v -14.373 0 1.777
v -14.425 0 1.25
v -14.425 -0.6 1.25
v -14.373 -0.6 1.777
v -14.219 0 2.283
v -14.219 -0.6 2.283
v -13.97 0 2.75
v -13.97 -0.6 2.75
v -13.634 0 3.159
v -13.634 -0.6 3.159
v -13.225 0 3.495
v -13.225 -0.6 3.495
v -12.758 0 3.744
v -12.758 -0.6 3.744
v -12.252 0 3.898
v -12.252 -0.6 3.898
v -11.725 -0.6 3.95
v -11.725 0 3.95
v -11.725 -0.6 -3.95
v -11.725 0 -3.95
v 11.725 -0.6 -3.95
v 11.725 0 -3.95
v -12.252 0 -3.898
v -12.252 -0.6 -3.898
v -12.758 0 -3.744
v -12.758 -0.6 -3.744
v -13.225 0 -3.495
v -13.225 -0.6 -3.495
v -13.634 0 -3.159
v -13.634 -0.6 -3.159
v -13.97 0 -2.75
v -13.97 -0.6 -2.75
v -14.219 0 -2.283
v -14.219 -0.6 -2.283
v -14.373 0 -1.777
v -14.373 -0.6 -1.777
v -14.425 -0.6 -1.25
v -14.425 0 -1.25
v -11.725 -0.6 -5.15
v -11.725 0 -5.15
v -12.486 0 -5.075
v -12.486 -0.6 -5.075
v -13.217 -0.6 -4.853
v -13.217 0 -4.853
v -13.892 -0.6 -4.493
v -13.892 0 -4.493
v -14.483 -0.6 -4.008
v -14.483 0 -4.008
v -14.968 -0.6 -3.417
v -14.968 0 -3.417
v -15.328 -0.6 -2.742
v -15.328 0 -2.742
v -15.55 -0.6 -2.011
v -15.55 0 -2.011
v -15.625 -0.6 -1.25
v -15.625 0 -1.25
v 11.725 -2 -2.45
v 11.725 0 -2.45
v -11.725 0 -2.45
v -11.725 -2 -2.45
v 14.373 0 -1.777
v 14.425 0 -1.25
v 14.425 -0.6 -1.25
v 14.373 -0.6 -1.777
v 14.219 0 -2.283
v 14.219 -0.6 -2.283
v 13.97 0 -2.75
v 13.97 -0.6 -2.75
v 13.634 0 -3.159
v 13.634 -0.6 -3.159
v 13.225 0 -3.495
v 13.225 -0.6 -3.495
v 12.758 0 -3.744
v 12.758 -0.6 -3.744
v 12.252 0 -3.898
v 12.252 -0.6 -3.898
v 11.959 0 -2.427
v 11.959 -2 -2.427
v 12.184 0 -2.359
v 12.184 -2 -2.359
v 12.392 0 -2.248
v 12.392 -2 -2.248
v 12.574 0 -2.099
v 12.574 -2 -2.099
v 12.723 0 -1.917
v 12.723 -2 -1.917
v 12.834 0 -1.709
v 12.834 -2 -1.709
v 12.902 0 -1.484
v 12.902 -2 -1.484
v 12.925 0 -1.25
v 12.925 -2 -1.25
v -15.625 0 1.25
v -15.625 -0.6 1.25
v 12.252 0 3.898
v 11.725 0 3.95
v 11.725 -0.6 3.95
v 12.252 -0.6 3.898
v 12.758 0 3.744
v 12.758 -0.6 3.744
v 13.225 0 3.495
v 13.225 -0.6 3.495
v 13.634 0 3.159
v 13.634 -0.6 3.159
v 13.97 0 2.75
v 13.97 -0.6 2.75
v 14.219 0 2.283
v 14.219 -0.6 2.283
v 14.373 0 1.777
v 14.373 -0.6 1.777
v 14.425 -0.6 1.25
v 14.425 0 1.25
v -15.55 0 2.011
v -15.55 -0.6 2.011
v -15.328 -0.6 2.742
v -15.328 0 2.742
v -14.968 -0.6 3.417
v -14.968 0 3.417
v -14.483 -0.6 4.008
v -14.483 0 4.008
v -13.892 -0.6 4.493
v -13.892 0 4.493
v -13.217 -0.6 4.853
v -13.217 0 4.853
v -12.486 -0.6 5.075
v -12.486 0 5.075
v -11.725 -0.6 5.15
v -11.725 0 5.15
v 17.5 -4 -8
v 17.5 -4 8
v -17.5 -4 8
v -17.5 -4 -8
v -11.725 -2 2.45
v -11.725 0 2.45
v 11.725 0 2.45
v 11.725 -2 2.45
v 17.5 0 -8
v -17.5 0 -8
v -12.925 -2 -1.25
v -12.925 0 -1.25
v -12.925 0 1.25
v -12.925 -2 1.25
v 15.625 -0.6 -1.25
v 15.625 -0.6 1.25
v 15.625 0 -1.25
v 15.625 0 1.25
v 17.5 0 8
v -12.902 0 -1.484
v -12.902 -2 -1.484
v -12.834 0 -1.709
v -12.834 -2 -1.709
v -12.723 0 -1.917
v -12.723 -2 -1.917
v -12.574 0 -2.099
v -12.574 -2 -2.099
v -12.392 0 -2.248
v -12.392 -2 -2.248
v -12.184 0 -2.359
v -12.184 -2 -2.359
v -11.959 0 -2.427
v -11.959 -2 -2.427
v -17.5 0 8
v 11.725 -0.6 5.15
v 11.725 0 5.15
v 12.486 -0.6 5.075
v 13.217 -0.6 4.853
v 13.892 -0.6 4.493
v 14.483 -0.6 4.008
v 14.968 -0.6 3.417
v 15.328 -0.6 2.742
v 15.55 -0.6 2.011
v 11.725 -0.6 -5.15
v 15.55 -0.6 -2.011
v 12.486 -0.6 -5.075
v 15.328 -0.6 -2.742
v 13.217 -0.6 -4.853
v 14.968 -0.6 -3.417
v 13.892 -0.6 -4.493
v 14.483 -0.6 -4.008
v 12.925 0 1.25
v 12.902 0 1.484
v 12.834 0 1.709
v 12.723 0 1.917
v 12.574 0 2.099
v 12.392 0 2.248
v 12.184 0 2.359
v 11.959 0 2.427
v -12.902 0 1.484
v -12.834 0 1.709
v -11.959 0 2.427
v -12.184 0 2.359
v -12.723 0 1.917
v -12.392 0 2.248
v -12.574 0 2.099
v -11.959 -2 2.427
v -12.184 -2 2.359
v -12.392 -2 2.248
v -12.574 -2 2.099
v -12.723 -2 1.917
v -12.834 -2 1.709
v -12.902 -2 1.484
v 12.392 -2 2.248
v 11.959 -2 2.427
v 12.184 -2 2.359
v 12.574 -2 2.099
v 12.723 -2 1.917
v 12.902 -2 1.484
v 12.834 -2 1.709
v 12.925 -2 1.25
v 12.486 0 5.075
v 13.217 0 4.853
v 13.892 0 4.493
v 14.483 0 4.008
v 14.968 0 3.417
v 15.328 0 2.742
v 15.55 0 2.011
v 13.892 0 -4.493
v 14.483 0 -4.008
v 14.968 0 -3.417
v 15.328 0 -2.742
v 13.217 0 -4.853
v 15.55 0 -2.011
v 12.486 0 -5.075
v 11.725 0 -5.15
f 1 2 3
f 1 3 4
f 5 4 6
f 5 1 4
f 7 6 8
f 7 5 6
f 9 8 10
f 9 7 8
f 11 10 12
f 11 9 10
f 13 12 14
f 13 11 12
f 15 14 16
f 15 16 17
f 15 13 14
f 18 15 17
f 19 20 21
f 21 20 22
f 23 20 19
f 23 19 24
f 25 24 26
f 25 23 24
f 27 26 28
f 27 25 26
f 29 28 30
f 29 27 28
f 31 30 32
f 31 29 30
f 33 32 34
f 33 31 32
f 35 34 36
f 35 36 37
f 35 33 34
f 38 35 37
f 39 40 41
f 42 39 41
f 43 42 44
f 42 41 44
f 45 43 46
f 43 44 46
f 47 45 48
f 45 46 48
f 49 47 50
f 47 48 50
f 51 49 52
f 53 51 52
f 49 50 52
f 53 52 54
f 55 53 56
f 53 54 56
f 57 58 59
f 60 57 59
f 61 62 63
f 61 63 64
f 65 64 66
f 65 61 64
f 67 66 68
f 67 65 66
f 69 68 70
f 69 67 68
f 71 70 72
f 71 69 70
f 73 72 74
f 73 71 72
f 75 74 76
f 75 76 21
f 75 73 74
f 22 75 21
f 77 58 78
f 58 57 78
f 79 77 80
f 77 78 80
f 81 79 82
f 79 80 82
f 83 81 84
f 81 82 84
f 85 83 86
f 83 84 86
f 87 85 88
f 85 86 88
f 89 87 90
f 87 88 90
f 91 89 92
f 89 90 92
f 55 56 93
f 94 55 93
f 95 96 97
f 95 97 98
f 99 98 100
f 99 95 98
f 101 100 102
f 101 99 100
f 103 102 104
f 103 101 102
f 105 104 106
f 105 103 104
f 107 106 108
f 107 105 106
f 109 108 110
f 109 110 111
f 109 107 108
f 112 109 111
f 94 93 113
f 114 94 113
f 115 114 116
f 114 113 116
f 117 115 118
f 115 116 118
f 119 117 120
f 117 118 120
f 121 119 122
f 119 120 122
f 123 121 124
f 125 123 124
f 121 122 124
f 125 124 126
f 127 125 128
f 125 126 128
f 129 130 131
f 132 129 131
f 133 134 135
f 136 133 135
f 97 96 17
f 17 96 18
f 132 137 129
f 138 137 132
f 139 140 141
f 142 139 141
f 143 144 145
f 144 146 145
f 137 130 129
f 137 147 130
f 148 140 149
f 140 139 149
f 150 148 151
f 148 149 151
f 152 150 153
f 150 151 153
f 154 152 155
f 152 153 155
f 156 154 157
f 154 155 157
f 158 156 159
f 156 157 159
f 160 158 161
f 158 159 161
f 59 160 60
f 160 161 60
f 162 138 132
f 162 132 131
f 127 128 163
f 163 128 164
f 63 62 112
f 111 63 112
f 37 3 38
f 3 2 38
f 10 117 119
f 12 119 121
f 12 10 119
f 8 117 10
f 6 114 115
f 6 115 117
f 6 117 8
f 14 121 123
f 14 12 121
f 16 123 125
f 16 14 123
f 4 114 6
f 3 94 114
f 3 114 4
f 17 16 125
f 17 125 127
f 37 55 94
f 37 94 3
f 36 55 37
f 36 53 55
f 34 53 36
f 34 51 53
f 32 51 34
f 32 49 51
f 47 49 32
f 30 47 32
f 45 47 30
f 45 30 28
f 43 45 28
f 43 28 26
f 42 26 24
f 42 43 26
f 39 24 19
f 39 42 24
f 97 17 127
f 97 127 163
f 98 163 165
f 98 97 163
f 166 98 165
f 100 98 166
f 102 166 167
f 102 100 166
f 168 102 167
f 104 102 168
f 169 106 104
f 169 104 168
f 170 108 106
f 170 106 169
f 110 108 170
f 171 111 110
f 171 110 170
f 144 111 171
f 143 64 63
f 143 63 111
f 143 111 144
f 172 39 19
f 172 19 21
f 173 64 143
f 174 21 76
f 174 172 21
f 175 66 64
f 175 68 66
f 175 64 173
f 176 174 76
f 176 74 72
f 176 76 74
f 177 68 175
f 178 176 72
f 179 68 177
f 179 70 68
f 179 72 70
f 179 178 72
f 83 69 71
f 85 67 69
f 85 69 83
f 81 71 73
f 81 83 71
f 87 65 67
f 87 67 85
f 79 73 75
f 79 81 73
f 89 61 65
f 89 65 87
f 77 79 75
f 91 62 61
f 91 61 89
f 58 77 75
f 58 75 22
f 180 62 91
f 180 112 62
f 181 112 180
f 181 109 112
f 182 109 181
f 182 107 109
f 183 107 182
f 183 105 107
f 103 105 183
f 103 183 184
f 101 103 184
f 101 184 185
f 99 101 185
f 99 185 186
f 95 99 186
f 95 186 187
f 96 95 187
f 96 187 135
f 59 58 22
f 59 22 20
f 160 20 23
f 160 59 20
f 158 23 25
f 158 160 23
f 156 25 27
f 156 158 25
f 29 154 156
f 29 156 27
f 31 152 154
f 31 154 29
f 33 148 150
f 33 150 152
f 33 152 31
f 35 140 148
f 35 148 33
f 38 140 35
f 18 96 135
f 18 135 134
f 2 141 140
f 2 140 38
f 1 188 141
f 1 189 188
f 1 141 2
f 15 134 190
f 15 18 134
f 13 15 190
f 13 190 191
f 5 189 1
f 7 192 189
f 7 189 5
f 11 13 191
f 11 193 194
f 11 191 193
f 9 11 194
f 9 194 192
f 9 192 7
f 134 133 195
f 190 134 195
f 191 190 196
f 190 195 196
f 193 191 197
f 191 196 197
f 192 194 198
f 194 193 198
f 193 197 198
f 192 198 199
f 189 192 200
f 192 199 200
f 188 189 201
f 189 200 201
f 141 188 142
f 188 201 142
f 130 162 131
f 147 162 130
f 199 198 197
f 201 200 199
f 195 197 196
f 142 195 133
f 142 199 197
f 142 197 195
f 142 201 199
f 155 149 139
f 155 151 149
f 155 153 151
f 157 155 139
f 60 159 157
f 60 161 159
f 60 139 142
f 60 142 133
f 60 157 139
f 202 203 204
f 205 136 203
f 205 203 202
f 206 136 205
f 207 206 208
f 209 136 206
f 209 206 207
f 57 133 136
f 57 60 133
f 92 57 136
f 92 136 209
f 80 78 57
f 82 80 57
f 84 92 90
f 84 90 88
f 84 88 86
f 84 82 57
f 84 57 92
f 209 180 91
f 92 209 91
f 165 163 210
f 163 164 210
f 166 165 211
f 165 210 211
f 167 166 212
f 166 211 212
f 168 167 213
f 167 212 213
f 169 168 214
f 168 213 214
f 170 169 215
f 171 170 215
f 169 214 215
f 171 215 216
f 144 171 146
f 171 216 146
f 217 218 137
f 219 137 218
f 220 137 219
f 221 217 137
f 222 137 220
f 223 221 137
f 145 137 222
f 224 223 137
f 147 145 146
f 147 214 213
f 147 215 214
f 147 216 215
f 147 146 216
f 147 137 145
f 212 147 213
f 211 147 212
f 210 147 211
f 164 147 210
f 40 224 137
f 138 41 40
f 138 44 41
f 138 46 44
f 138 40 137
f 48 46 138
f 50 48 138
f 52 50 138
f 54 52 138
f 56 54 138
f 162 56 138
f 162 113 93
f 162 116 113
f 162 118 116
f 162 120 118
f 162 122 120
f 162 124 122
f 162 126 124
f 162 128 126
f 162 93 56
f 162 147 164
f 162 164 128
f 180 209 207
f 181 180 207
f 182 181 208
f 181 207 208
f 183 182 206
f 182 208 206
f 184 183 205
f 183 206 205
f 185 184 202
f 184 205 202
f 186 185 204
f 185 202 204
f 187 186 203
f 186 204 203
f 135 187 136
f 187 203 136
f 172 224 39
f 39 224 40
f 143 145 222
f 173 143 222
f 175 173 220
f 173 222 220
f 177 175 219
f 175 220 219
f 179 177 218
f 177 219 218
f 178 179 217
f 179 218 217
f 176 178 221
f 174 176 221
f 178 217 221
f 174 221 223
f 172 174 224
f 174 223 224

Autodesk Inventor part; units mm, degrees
ref_plane "YZ Plane" through (0, 0, 0) normal (1, 0, 0) x (0, 1, 0)
ref_plane "XZ Plane" through (0, 0, 0) normal (0, 1, 0) x (-1, 0, 0)
ref_plane "XY Plane" through (0, 0, 0) normal (0, 0, 1) x (1, 0, 0)
sketch "Sketch1" plane through (0, 0, 0) normal (0, 1, 0) x (-1, 0, 0)
  line L0 (13.925, -3.65) -> (-13.925, -3.65)
  line L1 (-13.925, -3.65) -> (-13.925, 3.65)
  line L2 (-13.925, 3.65) -> (13.925, 3.65)
  line L3 (13.925, 3.65) -> (13.925, -3.65)
  line L4 (13.925, -3.65) -> (-13.925, 3.65) construction
  line L5 (-13.925, -3.65) -> (13.925, 3.65) construction
  line L6 (11.725, -1.25) -> (-11.725, -1.25)
  line L7 (-11.725, -1.25) -> (-11.725, 1.25)
  line L8 (-11.725, 1.25) -> (11.725, 1.25)
  line L9 (11.725, 1.25) -> (11.725, -1.25)
  line L10 (11.725, -1.25) -> (-11.725, 1.25) construction
  line L11 (-11.725, -1.25) -> (11.725, 1.25) construction
  line L12 (11.725, -1.25) -> (11.725, -3.65) construction
  line L13 (11.725, 1.25) -> (11.725, 3.65) construction
  line L14 (11.725, -1.25) -> (13.925, -1.25) construction
  line L15 (-11.725, -1.25) -> (-13.925, -1.25) construction
  point P0 (0, 0)
  point P1 (0, 0)
  point P2 (0, 0)
  point P3 (0, 0)
  dimension "d0" = 27.85
  dimension "d1" = 7.3
  dimension "d2" = 2.4
  dimension "d3" = 2.4
  dimension "d4" = 2.5
  dimension "d5" = 2.2
  dimension "d6" = 23.45
sketch "Sketch2" plane through (0, 0, 0) normal (0, 1, 0) x (-1, 0, 0)
  line L0 (17.5, 8) -> (-17.5, 8)
  line L1 (-17.5, 8) -> (-17.5, -8)
  line L2 (-17.5, -8) -> (17.5, -8)
  line L3 (17.5, -8) -> (17.5, 8)
  line L4 (17.5, 8) -> (-17.5, -8) construction
  point P0 (0, 0)
  point P1 (0, 0)
  dimension "d7" = 35
  dimension "d8" = 16
extrude "Extrusion1" add sketch "Sketch2" against normal blind 4
sketch "Sketch5" plane through (0, 0, 0) normal (0, 1, 0) x (1, 0, 0)
  line L0 (-12.925, -2.45) -> (12.925, -2.45)
  line L1 (12.925, -2.45) -> (12.925, 2.45)
  line L2 (12.925, 2.45) -> (-12.925, 2.45)
  line L3 (-12.925, 2.45) -> (-12.925, -2.45)
  line L4 (-12.925, -2.45) -> (12.925, 2.45) construction
  line L5 (11.725, -1.25) -> (-11.725, -1.25) construction
  line L6 (-11.725, 1.25) -> (11.725, 1.25) construction
  line L7 (24.5, 0) -> (-24.5, 0) construction
  line L8 (0, 11.2) -> (0, -11.2) construction
  point P0 (0, 0)
  point P1 (0, 0)
  dimension "d11" = 1.2
  dimension "d12" = 1.2
extrude "Extrusion2" cut sketch "Sketch5" against normal blind 2
fillet "Fillet1" radius 1.2 4 edges at (12.925, -1, 2.45) (-12.925, -1, 2.45) (-12.925, -1, -2.45) (12.925, -1, -2.45)
sketch "Sketch6" plane through (0, 0, 0) normal (0, 1, 0) x (1, 0, 0)
  arc A0 (12.925, 1.25) -> (11.725, 2.45) centre (11.725, 1.25) ccw projected
  line L0 (-11.725, 2.45) -> (11.725, 2.45) projected
  arc A1 (-11.725, 2.45) -> (-12.925, 1.25) centre (-11.725, 1.25) ccw projected
  line L1 (-12.925, -1.25) -> (-12.925, 1.25) projected
  arc A2 (-12.925, -1.25) -> (-11.725, -2.45) centre (-11.725, -1.25) ccw projected
  line L2 (11.725, -2.45) -> (-11.725, -2.45) projected
  arc A3 (11.725, -2.45) -> (12.925, -1.25) centre (11.725, -1.25) ccw projected
  line L3 (12.925, 1.25) -> (12.925, -1.25) projected
  arc A4 (14.425, 1.25) -> (11.725, 3.95) centre (11.725, 1.25) ccw
  line L4 (14.425, 1.25) -> (14.425, -1.25)
  arc A5 (11.725, -3.95) -> (14.425, -1.25) centre (11.725, -1.25) ccw
  line L5 (11.725, -3.95) -> (-11.725, -3.95)
  arc A6 (-14.425, -1.25) -> (-11.725, -3.95) centre (-11.725, -1.25) ccw
  line L6 (-14.425, -1.25) -> (-14.425, 1.25)
  arc A7 (-11.725, 3.95) -> (-14.425, 1.25) centre (-11.725, 1.25) ccw
  line L7 (-11.725, 3.95) -> (11.725, 3.95)
  line L8 (-15.625, 1.25) -> (-15.625, -1.25)
  arc A8 (-15.625, -1.25) -> (-11.725, -5.15) centre (-11.725, -1.25) ccw
  line L9 (-11.725, -5.15) -> (11.725, -5.15)
  arc A9 (11.725, -5.15) -> (15.625, -1.25) centre (11.725, -1.25) ccw
  line L10 (15.625, -1.25) -> (15.625, 1.25)
  arc A10 (15.625, 1.25) -> (11.725, 5.15) centre (11.725, 1.25) ccw
  line L11 (11.725, 5.15) -> (-11.725, 5.15)
  arc A11 (-11.725, 5.15) -> (-15.625, 1.25) centre (-11.725, 1.25) ccw
  point P0 (0, 0)
  dimension "d16" = 1.5
  dimension "d17" = 1.2
extrude "Extrusion3" cut sketch "Sketch6" against normal blind 0.6 contours A11 L11 A10 L10 A9 L9 A8 L8
sketch "Sketch7" plane through (0, 0, 0) normal (0, 1, 0) x (1, 0, 0)
  line L0 (-29.5, -10) -> (29.5, -10)
  line L1 (29.5, -10) -> (29.5, 10)
  line L2 (29.5, 10) -> (-29.5, 10)
  line L3 (-29.5, 10) -> (-29.5, -10)
  line L4 (-41.3, 0) -> (41.3, 0) construction
  line L5 (0, 14) -> (0, -14) construction
  line L6 (-17.5, 8) -> (-17.5, -8) construction
  line L7 (17.5, 8) -> (-17.5, 8) construction
  point P0 (0, 0)
  dimension "d20" = 12
  dimension "d21" = 2
equation "\"d12\" = d11"
properties part number "Capping_Insert"
